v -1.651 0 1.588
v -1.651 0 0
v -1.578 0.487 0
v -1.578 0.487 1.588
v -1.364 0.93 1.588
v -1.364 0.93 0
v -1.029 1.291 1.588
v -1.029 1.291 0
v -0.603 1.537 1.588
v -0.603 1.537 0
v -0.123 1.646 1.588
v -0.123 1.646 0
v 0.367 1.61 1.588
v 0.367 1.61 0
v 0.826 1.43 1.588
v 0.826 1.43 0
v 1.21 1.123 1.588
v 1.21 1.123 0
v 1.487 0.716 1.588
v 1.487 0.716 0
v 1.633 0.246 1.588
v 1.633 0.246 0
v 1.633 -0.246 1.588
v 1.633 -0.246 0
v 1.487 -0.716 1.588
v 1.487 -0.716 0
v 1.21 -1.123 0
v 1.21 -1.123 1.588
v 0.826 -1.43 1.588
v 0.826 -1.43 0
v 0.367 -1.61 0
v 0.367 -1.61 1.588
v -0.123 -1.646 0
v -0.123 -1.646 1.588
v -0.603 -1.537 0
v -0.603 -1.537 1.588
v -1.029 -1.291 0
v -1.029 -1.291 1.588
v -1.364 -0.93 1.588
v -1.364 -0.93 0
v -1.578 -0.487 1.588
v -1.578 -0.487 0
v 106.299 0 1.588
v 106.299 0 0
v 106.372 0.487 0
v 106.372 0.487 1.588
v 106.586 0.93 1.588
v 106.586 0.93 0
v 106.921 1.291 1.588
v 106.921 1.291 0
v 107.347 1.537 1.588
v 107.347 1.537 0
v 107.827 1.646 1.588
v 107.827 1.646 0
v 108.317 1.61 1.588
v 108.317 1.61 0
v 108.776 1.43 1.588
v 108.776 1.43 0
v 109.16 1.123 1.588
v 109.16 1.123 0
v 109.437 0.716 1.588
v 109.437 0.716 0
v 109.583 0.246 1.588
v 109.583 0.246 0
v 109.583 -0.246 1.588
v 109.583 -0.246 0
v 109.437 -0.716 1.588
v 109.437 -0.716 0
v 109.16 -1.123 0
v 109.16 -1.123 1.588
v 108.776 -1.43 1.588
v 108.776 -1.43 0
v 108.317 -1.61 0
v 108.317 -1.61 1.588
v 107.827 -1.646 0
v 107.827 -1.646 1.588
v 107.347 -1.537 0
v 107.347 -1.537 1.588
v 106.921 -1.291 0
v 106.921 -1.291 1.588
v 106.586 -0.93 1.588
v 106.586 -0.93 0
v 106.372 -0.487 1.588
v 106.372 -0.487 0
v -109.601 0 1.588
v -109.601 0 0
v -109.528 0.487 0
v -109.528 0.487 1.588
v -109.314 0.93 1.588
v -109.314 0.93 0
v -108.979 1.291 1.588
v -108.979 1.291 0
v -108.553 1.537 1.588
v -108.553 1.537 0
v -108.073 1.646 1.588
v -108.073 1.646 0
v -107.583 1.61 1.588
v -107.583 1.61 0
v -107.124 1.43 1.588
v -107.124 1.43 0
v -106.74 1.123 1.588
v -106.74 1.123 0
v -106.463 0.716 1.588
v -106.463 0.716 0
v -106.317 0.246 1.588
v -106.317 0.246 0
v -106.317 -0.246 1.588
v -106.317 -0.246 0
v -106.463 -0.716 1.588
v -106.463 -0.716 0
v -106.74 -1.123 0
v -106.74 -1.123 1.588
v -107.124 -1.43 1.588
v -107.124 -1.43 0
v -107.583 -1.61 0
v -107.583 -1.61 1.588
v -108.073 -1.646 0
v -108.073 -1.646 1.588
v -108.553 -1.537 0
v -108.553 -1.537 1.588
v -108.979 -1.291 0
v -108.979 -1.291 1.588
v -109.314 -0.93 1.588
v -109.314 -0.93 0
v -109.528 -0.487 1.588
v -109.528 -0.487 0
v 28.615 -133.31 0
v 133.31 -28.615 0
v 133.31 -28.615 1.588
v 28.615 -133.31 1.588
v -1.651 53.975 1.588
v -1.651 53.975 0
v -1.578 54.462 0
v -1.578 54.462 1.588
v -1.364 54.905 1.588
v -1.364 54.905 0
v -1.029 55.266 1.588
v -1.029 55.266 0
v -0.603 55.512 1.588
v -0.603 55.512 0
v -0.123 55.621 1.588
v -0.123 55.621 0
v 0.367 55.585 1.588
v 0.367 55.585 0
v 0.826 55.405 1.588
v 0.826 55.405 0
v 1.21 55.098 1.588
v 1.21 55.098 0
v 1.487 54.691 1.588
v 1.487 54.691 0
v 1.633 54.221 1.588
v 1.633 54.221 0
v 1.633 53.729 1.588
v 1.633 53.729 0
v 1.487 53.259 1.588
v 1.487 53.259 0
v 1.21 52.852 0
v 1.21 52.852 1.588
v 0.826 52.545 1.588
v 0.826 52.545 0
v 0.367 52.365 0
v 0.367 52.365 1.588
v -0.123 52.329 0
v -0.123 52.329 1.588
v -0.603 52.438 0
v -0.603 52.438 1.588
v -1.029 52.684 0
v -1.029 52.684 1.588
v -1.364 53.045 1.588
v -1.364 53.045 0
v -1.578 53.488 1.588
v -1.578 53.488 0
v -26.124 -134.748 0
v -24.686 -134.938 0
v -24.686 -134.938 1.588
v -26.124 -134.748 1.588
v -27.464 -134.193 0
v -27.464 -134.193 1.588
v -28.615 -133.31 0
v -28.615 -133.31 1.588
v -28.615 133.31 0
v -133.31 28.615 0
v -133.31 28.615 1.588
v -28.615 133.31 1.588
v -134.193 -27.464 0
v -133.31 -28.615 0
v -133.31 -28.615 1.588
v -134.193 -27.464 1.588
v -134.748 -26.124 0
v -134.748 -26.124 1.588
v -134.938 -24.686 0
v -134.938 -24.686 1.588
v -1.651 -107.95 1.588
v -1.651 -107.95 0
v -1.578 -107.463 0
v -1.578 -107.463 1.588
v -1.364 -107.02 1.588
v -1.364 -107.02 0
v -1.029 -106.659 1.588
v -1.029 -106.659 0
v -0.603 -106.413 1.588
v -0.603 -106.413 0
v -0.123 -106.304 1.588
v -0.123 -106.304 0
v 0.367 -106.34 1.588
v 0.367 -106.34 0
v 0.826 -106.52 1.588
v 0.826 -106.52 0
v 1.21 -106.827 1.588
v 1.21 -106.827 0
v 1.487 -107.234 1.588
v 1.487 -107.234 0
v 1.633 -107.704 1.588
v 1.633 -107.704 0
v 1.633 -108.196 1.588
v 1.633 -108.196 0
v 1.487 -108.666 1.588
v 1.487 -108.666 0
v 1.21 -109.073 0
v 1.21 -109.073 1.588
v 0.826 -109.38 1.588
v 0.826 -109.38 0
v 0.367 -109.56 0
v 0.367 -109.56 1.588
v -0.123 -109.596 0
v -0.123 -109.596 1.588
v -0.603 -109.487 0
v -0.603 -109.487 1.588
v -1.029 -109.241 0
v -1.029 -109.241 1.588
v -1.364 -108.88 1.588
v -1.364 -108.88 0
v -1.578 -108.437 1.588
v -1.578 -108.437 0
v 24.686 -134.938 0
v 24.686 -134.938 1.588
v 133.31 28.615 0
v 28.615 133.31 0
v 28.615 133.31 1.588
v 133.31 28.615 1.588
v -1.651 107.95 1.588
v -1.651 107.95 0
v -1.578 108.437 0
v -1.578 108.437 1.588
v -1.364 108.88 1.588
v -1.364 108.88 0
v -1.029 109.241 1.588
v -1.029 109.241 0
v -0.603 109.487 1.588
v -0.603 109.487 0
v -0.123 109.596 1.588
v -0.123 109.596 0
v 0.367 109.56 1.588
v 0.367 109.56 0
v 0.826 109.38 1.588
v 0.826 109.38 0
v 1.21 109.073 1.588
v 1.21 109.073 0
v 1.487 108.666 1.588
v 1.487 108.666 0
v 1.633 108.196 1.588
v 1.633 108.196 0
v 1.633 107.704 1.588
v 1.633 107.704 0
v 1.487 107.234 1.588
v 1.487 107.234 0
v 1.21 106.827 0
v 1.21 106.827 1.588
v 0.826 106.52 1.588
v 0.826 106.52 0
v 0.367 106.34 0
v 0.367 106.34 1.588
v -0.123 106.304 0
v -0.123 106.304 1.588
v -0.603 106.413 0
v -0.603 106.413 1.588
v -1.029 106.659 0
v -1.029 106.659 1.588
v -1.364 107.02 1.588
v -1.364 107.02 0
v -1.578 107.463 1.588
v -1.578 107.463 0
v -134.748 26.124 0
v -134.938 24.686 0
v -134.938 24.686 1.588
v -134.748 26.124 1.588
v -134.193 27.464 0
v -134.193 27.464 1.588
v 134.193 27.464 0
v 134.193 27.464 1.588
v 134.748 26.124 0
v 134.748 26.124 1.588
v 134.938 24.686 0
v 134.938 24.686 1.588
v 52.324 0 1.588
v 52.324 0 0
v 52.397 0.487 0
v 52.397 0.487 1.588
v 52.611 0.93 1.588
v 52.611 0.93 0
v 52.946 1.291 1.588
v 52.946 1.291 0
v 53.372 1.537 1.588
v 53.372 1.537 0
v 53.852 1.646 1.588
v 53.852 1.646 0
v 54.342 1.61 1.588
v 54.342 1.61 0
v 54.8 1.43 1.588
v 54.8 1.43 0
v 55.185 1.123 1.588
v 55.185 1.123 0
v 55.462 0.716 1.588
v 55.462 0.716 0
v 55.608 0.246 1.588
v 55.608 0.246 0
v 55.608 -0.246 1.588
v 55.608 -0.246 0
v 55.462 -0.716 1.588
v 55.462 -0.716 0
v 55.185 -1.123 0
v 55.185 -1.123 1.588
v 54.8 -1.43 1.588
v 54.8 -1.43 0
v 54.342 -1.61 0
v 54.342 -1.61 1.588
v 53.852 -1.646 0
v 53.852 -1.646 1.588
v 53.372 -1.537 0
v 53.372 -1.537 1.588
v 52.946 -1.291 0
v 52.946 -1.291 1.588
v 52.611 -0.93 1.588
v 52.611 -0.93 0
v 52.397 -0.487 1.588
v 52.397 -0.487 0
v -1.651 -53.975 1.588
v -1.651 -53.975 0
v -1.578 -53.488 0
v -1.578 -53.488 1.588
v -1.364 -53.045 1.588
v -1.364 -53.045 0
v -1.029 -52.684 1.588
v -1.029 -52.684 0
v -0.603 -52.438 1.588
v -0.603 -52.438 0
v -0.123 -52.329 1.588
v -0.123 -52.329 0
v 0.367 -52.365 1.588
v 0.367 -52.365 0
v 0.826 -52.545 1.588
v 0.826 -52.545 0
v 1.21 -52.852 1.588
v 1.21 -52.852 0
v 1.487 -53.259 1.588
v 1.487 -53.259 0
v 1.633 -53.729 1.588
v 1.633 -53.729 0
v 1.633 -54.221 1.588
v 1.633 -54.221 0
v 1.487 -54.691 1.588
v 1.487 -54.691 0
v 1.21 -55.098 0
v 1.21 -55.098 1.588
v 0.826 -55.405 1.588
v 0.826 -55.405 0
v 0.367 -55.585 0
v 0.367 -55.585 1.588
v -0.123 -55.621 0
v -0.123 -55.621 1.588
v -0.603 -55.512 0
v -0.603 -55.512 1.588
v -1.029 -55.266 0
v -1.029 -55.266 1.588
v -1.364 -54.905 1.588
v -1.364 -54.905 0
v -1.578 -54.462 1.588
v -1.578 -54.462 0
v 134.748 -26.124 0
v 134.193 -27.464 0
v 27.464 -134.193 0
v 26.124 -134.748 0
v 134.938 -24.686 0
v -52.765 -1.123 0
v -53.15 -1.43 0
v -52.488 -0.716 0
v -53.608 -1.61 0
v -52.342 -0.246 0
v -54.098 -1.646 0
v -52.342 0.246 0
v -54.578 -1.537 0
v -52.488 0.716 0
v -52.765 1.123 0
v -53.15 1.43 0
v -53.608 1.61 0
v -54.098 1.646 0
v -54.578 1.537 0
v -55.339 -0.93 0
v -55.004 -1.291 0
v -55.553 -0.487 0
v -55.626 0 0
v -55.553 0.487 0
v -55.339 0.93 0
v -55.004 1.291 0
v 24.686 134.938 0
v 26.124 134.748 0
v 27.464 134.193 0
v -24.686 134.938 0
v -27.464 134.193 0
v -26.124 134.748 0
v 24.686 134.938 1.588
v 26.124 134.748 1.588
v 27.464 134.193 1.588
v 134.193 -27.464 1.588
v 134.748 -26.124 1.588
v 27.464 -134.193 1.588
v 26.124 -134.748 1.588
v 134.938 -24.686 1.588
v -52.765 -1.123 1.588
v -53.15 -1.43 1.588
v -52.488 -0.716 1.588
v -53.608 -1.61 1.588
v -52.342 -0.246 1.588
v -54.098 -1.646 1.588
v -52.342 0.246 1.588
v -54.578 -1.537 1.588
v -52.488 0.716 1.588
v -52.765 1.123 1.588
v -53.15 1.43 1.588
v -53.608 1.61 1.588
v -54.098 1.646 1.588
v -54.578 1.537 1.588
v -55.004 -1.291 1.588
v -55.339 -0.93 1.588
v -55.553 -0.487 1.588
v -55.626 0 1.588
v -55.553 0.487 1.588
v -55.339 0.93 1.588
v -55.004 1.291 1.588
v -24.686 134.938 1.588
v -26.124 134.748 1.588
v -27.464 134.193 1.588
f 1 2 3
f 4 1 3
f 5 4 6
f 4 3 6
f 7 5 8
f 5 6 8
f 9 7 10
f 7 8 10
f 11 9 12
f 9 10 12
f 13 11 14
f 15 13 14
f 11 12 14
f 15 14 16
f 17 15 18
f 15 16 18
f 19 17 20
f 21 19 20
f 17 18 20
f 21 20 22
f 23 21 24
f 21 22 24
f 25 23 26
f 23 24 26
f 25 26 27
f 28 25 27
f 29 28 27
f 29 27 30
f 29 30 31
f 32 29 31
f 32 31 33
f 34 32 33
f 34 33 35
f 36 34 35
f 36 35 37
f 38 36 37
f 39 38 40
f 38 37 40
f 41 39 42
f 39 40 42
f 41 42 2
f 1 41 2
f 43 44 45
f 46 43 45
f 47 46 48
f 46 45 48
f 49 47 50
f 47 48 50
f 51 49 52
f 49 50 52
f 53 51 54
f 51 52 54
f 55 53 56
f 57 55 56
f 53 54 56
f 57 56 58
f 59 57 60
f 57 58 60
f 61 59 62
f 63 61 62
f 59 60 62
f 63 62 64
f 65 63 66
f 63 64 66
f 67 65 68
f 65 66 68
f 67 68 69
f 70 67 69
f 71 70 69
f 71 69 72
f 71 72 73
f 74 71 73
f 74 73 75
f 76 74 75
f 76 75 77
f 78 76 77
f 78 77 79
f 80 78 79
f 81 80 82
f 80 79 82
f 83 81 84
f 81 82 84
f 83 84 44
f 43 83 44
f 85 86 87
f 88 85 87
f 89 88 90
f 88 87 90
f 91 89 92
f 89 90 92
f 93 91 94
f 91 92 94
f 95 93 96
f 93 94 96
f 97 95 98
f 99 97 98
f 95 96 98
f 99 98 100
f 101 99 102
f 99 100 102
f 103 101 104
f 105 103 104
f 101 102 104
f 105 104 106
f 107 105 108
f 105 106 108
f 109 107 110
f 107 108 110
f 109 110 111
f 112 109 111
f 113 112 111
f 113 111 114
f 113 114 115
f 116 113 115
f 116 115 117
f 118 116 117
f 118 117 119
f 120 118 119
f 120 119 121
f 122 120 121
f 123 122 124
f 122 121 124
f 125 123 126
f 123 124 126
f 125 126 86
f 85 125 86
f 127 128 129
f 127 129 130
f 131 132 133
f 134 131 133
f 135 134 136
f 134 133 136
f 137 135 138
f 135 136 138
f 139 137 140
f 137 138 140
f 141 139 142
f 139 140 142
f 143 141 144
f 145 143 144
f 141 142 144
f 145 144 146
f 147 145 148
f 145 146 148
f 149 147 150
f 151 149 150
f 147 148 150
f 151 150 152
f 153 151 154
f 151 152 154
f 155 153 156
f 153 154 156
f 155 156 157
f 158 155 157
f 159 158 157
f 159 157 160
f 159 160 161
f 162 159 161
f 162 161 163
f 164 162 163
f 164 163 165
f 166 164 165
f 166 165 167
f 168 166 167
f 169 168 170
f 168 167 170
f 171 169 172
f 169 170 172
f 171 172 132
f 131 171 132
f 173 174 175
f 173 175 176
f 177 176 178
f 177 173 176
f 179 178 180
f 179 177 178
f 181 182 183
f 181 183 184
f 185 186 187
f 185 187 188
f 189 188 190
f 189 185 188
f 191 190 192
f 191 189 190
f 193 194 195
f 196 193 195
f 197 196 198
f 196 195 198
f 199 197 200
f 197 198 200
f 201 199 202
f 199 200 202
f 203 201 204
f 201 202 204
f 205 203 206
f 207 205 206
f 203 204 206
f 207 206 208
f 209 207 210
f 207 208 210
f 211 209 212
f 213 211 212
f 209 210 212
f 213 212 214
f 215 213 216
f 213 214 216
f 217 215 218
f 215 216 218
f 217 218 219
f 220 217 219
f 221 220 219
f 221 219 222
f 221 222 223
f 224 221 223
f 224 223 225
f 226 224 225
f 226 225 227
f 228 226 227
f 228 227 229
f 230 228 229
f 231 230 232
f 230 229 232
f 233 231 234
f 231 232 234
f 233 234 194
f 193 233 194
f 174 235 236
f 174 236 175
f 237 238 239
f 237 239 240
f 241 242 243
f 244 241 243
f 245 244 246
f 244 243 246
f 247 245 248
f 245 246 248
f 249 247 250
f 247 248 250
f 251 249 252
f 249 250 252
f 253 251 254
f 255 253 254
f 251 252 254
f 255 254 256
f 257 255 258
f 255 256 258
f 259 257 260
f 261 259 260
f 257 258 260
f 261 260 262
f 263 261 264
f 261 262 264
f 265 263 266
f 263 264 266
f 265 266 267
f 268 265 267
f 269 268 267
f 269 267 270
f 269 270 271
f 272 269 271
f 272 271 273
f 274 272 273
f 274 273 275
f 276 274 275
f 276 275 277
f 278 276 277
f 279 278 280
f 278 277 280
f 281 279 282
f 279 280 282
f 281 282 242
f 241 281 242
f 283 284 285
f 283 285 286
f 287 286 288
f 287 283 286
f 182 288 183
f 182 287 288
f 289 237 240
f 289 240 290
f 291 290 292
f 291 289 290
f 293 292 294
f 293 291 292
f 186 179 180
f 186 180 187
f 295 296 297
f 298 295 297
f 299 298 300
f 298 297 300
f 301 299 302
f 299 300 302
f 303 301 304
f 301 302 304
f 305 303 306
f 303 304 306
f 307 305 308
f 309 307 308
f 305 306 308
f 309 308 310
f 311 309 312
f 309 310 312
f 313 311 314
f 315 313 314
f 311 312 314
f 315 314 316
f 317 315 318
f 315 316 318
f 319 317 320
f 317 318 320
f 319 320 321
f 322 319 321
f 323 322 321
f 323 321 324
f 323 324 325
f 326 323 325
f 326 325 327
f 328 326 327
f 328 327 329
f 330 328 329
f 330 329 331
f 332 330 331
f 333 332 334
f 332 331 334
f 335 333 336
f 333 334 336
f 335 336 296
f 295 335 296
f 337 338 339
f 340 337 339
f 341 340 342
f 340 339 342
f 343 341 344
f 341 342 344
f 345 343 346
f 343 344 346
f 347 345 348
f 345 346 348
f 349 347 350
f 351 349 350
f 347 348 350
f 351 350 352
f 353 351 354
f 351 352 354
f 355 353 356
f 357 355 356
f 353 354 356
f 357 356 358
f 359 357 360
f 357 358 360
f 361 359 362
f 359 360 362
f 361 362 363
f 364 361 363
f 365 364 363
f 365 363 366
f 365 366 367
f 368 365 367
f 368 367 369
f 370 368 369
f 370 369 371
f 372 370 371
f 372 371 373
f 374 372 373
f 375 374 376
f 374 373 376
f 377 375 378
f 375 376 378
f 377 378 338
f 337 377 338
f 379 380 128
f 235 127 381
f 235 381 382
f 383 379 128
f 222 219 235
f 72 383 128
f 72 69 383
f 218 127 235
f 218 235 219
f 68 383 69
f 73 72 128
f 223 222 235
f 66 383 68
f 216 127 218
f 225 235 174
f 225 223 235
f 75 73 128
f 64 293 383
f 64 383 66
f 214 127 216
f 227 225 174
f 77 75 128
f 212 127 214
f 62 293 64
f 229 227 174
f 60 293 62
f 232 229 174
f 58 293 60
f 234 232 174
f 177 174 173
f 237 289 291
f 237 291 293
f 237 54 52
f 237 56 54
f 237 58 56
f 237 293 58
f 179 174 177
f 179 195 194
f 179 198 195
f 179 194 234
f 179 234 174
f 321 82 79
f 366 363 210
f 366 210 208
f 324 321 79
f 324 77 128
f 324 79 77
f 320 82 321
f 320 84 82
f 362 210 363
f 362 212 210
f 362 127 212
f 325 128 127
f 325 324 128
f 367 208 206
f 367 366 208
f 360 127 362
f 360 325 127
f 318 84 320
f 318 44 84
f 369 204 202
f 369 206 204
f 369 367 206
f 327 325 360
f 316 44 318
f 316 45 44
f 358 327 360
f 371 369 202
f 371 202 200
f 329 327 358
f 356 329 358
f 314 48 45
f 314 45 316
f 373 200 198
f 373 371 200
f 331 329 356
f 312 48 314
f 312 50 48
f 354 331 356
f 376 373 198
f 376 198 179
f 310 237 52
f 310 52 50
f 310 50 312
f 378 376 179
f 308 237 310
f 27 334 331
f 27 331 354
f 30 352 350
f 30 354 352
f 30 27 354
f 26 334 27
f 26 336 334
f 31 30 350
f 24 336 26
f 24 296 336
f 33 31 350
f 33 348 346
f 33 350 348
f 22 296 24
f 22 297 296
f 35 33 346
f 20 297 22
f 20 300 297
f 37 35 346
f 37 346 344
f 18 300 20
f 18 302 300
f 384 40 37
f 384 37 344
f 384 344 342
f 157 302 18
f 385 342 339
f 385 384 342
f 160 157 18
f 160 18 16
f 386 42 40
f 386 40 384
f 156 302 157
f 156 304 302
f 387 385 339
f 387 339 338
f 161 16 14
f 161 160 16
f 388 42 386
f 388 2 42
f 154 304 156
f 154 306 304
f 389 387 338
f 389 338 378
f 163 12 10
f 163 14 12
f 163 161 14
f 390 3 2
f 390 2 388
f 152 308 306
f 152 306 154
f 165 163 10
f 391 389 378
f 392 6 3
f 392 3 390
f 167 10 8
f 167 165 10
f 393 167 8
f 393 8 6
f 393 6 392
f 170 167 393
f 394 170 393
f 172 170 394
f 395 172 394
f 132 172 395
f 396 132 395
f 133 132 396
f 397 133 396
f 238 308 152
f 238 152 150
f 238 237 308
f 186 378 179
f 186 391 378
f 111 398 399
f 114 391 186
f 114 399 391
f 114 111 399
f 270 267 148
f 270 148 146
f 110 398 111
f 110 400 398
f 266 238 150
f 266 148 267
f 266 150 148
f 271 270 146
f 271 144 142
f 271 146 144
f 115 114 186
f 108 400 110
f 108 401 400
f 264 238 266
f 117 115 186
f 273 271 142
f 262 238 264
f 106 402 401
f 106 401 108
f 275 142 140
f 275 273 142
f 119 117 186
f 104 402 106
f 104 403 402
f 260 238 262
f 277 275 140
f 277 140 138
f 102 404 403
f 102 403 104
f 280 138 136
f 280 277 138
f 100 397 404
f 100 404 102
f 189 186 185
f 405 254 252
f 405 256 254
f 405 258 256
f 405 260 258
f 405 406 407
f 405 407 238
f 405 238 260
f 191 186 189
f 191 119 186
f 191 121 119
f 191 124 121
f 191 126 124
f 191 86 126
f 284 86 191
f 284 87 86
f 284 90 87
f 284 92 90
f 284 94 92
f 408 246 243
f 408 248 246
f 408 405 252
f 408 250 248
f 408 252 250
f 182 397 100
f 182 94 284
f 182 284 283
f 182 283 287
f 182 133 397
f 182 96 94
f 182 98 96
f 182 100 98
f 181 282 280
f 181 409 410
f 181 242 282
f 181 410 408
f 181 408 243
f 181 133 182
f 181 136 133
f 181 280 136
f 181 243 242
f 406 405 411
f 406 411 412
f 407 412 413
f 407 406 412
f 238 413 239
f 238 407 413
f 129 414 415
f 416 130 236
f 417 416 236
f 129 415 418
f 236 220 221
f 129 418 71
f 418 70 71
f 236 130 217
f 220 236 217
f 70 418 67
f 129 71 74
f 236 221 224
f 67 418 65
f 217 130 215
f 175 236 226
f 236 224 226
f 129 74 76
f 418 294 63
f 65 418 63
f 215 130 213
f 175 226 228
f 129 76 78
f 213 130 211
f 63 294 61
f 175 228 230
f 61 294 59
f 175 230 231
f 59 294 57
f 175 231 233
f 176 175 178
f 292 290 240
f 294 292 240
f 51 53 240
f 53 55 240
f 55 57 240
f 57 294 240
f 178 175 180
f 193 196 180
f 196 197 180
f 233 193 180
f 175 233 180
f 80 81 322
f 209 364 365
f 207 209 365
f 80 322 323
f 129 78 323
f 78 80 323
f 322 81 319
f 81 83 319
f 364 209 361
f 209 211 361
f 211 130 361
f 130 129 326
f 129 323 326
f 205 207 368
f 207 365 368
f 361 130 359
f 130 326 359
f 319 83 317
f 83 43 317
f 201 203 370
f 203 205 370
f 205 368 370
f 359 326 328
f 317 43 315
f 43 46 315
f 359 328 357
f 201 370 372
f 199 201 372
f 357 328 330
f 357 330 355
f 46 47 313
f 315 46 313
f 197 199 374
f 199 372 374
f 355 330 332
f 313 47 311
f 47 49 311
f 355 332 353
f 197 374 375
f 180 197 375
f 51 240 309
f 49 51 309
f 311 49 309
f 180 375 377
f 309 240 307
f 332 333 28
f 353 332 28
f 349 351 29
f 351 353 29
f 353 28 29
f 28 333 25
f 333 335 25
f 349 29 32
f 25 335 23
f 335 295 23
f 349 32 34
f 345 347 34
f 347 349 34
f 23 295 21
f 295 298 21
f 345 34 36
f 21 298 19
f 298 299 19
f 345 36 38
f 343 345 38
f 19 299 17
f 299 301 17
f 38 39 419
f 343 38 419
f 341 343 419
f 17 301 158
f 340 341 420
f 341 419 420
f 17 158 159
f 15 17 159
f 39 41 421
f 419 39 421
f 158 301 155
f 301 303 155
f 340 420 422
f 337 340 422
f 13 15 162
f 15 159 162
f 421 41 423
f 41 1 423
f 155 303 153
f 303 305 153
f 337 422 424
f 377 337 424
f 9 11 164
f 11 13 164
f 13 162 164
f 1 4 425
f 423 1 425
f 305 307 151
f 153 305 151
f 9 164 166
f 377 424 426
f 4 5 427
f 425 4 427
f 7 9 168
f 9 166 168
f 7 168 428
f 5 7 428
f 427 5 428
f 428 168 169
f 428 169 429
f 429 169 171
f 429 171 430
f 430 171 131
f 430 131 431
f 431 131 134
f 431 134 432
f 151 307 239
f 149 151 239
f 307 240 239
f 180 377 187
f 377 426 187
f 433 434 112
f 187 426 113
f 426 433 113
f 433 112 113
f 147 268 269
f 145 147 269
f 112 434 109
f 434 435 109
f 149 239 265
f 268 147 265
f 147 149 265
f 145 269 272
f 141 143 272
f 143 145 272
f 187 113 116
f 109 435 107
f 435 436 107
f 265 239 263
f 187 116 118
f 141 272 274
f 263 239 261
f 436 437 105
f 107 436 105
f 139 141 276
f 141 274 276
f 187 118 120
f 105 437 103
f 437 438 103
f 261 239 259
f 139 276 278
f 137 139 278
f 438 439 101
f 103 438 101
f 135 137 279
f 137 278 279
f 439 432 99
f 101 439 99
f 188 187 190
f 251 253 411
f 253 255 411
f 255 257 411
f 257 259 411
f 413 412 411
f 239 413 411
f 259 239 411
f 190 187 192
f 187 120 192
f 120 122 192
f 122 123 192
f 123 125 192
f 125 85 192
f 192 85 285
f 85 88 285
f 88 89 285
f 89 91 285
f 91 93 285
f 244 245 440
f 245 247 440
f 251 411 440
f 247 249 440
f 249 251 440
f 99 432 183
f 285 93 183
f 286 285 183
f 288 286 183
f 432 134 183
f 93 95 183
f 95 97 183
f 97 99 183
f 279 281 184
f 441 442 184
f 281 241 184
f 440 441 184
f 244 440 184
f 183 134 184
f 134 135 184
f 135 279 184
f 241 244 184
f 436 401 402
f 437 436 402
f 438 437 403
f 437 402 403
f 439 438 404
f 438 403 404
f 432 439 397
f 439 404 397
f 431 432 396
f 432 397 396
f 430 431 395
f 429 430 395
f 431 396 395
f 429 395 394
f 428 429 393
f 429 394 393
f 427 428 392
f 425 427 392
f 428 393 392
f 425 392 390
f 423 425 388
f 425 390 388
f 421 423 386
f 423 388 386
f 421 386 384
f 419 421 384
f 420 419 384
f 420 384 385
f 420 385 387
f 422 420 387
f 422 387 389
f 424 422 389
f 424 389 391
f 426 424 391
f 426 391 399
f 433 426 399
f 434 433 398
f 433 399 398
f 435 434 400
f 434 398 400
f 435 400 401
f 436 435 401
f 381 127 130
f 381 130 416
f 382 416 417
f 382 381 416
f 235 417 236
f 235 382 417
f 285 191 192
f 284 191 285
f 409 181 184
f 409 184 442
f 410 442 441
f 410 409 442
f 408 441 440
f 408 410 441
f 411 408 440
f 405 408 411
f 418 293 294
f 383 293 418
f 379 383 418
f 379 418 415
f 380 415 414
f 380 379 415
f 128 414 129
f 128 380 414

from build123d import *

# Parameters (mm, degrees)
SKETCH1_R           = 1.651
BOSS_EXTRUDE1_DEPTH = 1.5875


with BuildPart() as part:
    # Sketch1 → Boss-Extrude1 (new body)
    with BuildSketch(Plane(origin=(0, 0, 0), x_dir=(-1, 0, 0), z_dir=(0, 0, -1))):
        with BuildLine():
            Line((-133.310112052, -28.614887943), (-28.614887941, -133.310112054))
            ThreePointArc((-28.614887941, -133.310112054), (-26.812310708, -134.514555654), (-24.686025887, -134.937500002))
            Line((-24.686025887, -134.937500002), (24.68602589, -134.937500002))
            ThreePointArc((24.68602589, -134.937500002), (26.812310711, -134.514555654), (28.614887944, -133.310112054))
            Line((28.614887944, -133.310112054), (133.310112056, -28.614887942))
            ThreePointArc((133.310112056, -28.614887942), (134.514555656, -26.81231071), (134.937500003, -24.686025888))
            Line((134.937500003, -24.686025888), (134.937500003, 24.686025887))
            ThreePointArc((134.937500003, 24.686025887), (134.514555656, 26.812310709), (133.310112056, 28.614887942))
            Line((133.310112056, 28.614887942), (28.614887944, 133.310112054))
            ThreePointArc((28.614887944, 133.310112054), (26.812310711, 134.514555654), (24.68602589, 134.937500001))
            Line((24.68602589, 134.937500001), (-24.686025886, 134.937500001))
            ThreePointArc((-24.686025886, 134.937500001), (-26.812310708, 134.514555654), (-28.614887941, 133.310112054))
            Line((-28.614887941, 133.310112054), (-133.310112053, 28.614887942))
            ThreePointArc((-133.310112053, 28.614887942), (-134.514555652, 26.81231071), (-134.9375, 24.686025888))
            Line((-134.9375, 24.686025888), (-134.9375, -24.686025888))
            ThreePointArc((-134.9375, -24.686025888), (-134.514555652, -26.81231071), (-133.310112052, -28.614887943))
        make_face()
        with Locations((0, 53.975)):
            Circle(SKETCH1_R, mode=Mode.SUBTRACT)
        Circle(SKETCH1_R, mode=Mode.SUBTRACT)
        with Locations((0, -107.95)):
            Circle(SKETCH1_R, mode=Mode.SUBTRACT)
        with Locations((0, 107.95)):
            Circle(SKETCH1_R, mode=Mode.SUBTRACT)
        with Locations((-53.975, 0)):
            Circle(SKETCH1_R, mode=Mode.SUBTRACT)
        with Locations((53.975, 0)):
            Circle(SKETCH1_R, mode=Mode.SUBTRACT)
        with Locations((0, -53.975)):
            Circle(SKETCH1_R, mode=Mode.SUBTRACT)
        with Locations((-107.95, 0)):
            Circle(SKETCH1_R, mode=Mode.SUBTRACT)
        with Locations((107.95, 0)):
            Circle(SKETCH1_R, mode=Mode.SUBTRACT)
    extrude(amount=-BOSS_EXTRUDE1_DEPTH)


solid = part.part
